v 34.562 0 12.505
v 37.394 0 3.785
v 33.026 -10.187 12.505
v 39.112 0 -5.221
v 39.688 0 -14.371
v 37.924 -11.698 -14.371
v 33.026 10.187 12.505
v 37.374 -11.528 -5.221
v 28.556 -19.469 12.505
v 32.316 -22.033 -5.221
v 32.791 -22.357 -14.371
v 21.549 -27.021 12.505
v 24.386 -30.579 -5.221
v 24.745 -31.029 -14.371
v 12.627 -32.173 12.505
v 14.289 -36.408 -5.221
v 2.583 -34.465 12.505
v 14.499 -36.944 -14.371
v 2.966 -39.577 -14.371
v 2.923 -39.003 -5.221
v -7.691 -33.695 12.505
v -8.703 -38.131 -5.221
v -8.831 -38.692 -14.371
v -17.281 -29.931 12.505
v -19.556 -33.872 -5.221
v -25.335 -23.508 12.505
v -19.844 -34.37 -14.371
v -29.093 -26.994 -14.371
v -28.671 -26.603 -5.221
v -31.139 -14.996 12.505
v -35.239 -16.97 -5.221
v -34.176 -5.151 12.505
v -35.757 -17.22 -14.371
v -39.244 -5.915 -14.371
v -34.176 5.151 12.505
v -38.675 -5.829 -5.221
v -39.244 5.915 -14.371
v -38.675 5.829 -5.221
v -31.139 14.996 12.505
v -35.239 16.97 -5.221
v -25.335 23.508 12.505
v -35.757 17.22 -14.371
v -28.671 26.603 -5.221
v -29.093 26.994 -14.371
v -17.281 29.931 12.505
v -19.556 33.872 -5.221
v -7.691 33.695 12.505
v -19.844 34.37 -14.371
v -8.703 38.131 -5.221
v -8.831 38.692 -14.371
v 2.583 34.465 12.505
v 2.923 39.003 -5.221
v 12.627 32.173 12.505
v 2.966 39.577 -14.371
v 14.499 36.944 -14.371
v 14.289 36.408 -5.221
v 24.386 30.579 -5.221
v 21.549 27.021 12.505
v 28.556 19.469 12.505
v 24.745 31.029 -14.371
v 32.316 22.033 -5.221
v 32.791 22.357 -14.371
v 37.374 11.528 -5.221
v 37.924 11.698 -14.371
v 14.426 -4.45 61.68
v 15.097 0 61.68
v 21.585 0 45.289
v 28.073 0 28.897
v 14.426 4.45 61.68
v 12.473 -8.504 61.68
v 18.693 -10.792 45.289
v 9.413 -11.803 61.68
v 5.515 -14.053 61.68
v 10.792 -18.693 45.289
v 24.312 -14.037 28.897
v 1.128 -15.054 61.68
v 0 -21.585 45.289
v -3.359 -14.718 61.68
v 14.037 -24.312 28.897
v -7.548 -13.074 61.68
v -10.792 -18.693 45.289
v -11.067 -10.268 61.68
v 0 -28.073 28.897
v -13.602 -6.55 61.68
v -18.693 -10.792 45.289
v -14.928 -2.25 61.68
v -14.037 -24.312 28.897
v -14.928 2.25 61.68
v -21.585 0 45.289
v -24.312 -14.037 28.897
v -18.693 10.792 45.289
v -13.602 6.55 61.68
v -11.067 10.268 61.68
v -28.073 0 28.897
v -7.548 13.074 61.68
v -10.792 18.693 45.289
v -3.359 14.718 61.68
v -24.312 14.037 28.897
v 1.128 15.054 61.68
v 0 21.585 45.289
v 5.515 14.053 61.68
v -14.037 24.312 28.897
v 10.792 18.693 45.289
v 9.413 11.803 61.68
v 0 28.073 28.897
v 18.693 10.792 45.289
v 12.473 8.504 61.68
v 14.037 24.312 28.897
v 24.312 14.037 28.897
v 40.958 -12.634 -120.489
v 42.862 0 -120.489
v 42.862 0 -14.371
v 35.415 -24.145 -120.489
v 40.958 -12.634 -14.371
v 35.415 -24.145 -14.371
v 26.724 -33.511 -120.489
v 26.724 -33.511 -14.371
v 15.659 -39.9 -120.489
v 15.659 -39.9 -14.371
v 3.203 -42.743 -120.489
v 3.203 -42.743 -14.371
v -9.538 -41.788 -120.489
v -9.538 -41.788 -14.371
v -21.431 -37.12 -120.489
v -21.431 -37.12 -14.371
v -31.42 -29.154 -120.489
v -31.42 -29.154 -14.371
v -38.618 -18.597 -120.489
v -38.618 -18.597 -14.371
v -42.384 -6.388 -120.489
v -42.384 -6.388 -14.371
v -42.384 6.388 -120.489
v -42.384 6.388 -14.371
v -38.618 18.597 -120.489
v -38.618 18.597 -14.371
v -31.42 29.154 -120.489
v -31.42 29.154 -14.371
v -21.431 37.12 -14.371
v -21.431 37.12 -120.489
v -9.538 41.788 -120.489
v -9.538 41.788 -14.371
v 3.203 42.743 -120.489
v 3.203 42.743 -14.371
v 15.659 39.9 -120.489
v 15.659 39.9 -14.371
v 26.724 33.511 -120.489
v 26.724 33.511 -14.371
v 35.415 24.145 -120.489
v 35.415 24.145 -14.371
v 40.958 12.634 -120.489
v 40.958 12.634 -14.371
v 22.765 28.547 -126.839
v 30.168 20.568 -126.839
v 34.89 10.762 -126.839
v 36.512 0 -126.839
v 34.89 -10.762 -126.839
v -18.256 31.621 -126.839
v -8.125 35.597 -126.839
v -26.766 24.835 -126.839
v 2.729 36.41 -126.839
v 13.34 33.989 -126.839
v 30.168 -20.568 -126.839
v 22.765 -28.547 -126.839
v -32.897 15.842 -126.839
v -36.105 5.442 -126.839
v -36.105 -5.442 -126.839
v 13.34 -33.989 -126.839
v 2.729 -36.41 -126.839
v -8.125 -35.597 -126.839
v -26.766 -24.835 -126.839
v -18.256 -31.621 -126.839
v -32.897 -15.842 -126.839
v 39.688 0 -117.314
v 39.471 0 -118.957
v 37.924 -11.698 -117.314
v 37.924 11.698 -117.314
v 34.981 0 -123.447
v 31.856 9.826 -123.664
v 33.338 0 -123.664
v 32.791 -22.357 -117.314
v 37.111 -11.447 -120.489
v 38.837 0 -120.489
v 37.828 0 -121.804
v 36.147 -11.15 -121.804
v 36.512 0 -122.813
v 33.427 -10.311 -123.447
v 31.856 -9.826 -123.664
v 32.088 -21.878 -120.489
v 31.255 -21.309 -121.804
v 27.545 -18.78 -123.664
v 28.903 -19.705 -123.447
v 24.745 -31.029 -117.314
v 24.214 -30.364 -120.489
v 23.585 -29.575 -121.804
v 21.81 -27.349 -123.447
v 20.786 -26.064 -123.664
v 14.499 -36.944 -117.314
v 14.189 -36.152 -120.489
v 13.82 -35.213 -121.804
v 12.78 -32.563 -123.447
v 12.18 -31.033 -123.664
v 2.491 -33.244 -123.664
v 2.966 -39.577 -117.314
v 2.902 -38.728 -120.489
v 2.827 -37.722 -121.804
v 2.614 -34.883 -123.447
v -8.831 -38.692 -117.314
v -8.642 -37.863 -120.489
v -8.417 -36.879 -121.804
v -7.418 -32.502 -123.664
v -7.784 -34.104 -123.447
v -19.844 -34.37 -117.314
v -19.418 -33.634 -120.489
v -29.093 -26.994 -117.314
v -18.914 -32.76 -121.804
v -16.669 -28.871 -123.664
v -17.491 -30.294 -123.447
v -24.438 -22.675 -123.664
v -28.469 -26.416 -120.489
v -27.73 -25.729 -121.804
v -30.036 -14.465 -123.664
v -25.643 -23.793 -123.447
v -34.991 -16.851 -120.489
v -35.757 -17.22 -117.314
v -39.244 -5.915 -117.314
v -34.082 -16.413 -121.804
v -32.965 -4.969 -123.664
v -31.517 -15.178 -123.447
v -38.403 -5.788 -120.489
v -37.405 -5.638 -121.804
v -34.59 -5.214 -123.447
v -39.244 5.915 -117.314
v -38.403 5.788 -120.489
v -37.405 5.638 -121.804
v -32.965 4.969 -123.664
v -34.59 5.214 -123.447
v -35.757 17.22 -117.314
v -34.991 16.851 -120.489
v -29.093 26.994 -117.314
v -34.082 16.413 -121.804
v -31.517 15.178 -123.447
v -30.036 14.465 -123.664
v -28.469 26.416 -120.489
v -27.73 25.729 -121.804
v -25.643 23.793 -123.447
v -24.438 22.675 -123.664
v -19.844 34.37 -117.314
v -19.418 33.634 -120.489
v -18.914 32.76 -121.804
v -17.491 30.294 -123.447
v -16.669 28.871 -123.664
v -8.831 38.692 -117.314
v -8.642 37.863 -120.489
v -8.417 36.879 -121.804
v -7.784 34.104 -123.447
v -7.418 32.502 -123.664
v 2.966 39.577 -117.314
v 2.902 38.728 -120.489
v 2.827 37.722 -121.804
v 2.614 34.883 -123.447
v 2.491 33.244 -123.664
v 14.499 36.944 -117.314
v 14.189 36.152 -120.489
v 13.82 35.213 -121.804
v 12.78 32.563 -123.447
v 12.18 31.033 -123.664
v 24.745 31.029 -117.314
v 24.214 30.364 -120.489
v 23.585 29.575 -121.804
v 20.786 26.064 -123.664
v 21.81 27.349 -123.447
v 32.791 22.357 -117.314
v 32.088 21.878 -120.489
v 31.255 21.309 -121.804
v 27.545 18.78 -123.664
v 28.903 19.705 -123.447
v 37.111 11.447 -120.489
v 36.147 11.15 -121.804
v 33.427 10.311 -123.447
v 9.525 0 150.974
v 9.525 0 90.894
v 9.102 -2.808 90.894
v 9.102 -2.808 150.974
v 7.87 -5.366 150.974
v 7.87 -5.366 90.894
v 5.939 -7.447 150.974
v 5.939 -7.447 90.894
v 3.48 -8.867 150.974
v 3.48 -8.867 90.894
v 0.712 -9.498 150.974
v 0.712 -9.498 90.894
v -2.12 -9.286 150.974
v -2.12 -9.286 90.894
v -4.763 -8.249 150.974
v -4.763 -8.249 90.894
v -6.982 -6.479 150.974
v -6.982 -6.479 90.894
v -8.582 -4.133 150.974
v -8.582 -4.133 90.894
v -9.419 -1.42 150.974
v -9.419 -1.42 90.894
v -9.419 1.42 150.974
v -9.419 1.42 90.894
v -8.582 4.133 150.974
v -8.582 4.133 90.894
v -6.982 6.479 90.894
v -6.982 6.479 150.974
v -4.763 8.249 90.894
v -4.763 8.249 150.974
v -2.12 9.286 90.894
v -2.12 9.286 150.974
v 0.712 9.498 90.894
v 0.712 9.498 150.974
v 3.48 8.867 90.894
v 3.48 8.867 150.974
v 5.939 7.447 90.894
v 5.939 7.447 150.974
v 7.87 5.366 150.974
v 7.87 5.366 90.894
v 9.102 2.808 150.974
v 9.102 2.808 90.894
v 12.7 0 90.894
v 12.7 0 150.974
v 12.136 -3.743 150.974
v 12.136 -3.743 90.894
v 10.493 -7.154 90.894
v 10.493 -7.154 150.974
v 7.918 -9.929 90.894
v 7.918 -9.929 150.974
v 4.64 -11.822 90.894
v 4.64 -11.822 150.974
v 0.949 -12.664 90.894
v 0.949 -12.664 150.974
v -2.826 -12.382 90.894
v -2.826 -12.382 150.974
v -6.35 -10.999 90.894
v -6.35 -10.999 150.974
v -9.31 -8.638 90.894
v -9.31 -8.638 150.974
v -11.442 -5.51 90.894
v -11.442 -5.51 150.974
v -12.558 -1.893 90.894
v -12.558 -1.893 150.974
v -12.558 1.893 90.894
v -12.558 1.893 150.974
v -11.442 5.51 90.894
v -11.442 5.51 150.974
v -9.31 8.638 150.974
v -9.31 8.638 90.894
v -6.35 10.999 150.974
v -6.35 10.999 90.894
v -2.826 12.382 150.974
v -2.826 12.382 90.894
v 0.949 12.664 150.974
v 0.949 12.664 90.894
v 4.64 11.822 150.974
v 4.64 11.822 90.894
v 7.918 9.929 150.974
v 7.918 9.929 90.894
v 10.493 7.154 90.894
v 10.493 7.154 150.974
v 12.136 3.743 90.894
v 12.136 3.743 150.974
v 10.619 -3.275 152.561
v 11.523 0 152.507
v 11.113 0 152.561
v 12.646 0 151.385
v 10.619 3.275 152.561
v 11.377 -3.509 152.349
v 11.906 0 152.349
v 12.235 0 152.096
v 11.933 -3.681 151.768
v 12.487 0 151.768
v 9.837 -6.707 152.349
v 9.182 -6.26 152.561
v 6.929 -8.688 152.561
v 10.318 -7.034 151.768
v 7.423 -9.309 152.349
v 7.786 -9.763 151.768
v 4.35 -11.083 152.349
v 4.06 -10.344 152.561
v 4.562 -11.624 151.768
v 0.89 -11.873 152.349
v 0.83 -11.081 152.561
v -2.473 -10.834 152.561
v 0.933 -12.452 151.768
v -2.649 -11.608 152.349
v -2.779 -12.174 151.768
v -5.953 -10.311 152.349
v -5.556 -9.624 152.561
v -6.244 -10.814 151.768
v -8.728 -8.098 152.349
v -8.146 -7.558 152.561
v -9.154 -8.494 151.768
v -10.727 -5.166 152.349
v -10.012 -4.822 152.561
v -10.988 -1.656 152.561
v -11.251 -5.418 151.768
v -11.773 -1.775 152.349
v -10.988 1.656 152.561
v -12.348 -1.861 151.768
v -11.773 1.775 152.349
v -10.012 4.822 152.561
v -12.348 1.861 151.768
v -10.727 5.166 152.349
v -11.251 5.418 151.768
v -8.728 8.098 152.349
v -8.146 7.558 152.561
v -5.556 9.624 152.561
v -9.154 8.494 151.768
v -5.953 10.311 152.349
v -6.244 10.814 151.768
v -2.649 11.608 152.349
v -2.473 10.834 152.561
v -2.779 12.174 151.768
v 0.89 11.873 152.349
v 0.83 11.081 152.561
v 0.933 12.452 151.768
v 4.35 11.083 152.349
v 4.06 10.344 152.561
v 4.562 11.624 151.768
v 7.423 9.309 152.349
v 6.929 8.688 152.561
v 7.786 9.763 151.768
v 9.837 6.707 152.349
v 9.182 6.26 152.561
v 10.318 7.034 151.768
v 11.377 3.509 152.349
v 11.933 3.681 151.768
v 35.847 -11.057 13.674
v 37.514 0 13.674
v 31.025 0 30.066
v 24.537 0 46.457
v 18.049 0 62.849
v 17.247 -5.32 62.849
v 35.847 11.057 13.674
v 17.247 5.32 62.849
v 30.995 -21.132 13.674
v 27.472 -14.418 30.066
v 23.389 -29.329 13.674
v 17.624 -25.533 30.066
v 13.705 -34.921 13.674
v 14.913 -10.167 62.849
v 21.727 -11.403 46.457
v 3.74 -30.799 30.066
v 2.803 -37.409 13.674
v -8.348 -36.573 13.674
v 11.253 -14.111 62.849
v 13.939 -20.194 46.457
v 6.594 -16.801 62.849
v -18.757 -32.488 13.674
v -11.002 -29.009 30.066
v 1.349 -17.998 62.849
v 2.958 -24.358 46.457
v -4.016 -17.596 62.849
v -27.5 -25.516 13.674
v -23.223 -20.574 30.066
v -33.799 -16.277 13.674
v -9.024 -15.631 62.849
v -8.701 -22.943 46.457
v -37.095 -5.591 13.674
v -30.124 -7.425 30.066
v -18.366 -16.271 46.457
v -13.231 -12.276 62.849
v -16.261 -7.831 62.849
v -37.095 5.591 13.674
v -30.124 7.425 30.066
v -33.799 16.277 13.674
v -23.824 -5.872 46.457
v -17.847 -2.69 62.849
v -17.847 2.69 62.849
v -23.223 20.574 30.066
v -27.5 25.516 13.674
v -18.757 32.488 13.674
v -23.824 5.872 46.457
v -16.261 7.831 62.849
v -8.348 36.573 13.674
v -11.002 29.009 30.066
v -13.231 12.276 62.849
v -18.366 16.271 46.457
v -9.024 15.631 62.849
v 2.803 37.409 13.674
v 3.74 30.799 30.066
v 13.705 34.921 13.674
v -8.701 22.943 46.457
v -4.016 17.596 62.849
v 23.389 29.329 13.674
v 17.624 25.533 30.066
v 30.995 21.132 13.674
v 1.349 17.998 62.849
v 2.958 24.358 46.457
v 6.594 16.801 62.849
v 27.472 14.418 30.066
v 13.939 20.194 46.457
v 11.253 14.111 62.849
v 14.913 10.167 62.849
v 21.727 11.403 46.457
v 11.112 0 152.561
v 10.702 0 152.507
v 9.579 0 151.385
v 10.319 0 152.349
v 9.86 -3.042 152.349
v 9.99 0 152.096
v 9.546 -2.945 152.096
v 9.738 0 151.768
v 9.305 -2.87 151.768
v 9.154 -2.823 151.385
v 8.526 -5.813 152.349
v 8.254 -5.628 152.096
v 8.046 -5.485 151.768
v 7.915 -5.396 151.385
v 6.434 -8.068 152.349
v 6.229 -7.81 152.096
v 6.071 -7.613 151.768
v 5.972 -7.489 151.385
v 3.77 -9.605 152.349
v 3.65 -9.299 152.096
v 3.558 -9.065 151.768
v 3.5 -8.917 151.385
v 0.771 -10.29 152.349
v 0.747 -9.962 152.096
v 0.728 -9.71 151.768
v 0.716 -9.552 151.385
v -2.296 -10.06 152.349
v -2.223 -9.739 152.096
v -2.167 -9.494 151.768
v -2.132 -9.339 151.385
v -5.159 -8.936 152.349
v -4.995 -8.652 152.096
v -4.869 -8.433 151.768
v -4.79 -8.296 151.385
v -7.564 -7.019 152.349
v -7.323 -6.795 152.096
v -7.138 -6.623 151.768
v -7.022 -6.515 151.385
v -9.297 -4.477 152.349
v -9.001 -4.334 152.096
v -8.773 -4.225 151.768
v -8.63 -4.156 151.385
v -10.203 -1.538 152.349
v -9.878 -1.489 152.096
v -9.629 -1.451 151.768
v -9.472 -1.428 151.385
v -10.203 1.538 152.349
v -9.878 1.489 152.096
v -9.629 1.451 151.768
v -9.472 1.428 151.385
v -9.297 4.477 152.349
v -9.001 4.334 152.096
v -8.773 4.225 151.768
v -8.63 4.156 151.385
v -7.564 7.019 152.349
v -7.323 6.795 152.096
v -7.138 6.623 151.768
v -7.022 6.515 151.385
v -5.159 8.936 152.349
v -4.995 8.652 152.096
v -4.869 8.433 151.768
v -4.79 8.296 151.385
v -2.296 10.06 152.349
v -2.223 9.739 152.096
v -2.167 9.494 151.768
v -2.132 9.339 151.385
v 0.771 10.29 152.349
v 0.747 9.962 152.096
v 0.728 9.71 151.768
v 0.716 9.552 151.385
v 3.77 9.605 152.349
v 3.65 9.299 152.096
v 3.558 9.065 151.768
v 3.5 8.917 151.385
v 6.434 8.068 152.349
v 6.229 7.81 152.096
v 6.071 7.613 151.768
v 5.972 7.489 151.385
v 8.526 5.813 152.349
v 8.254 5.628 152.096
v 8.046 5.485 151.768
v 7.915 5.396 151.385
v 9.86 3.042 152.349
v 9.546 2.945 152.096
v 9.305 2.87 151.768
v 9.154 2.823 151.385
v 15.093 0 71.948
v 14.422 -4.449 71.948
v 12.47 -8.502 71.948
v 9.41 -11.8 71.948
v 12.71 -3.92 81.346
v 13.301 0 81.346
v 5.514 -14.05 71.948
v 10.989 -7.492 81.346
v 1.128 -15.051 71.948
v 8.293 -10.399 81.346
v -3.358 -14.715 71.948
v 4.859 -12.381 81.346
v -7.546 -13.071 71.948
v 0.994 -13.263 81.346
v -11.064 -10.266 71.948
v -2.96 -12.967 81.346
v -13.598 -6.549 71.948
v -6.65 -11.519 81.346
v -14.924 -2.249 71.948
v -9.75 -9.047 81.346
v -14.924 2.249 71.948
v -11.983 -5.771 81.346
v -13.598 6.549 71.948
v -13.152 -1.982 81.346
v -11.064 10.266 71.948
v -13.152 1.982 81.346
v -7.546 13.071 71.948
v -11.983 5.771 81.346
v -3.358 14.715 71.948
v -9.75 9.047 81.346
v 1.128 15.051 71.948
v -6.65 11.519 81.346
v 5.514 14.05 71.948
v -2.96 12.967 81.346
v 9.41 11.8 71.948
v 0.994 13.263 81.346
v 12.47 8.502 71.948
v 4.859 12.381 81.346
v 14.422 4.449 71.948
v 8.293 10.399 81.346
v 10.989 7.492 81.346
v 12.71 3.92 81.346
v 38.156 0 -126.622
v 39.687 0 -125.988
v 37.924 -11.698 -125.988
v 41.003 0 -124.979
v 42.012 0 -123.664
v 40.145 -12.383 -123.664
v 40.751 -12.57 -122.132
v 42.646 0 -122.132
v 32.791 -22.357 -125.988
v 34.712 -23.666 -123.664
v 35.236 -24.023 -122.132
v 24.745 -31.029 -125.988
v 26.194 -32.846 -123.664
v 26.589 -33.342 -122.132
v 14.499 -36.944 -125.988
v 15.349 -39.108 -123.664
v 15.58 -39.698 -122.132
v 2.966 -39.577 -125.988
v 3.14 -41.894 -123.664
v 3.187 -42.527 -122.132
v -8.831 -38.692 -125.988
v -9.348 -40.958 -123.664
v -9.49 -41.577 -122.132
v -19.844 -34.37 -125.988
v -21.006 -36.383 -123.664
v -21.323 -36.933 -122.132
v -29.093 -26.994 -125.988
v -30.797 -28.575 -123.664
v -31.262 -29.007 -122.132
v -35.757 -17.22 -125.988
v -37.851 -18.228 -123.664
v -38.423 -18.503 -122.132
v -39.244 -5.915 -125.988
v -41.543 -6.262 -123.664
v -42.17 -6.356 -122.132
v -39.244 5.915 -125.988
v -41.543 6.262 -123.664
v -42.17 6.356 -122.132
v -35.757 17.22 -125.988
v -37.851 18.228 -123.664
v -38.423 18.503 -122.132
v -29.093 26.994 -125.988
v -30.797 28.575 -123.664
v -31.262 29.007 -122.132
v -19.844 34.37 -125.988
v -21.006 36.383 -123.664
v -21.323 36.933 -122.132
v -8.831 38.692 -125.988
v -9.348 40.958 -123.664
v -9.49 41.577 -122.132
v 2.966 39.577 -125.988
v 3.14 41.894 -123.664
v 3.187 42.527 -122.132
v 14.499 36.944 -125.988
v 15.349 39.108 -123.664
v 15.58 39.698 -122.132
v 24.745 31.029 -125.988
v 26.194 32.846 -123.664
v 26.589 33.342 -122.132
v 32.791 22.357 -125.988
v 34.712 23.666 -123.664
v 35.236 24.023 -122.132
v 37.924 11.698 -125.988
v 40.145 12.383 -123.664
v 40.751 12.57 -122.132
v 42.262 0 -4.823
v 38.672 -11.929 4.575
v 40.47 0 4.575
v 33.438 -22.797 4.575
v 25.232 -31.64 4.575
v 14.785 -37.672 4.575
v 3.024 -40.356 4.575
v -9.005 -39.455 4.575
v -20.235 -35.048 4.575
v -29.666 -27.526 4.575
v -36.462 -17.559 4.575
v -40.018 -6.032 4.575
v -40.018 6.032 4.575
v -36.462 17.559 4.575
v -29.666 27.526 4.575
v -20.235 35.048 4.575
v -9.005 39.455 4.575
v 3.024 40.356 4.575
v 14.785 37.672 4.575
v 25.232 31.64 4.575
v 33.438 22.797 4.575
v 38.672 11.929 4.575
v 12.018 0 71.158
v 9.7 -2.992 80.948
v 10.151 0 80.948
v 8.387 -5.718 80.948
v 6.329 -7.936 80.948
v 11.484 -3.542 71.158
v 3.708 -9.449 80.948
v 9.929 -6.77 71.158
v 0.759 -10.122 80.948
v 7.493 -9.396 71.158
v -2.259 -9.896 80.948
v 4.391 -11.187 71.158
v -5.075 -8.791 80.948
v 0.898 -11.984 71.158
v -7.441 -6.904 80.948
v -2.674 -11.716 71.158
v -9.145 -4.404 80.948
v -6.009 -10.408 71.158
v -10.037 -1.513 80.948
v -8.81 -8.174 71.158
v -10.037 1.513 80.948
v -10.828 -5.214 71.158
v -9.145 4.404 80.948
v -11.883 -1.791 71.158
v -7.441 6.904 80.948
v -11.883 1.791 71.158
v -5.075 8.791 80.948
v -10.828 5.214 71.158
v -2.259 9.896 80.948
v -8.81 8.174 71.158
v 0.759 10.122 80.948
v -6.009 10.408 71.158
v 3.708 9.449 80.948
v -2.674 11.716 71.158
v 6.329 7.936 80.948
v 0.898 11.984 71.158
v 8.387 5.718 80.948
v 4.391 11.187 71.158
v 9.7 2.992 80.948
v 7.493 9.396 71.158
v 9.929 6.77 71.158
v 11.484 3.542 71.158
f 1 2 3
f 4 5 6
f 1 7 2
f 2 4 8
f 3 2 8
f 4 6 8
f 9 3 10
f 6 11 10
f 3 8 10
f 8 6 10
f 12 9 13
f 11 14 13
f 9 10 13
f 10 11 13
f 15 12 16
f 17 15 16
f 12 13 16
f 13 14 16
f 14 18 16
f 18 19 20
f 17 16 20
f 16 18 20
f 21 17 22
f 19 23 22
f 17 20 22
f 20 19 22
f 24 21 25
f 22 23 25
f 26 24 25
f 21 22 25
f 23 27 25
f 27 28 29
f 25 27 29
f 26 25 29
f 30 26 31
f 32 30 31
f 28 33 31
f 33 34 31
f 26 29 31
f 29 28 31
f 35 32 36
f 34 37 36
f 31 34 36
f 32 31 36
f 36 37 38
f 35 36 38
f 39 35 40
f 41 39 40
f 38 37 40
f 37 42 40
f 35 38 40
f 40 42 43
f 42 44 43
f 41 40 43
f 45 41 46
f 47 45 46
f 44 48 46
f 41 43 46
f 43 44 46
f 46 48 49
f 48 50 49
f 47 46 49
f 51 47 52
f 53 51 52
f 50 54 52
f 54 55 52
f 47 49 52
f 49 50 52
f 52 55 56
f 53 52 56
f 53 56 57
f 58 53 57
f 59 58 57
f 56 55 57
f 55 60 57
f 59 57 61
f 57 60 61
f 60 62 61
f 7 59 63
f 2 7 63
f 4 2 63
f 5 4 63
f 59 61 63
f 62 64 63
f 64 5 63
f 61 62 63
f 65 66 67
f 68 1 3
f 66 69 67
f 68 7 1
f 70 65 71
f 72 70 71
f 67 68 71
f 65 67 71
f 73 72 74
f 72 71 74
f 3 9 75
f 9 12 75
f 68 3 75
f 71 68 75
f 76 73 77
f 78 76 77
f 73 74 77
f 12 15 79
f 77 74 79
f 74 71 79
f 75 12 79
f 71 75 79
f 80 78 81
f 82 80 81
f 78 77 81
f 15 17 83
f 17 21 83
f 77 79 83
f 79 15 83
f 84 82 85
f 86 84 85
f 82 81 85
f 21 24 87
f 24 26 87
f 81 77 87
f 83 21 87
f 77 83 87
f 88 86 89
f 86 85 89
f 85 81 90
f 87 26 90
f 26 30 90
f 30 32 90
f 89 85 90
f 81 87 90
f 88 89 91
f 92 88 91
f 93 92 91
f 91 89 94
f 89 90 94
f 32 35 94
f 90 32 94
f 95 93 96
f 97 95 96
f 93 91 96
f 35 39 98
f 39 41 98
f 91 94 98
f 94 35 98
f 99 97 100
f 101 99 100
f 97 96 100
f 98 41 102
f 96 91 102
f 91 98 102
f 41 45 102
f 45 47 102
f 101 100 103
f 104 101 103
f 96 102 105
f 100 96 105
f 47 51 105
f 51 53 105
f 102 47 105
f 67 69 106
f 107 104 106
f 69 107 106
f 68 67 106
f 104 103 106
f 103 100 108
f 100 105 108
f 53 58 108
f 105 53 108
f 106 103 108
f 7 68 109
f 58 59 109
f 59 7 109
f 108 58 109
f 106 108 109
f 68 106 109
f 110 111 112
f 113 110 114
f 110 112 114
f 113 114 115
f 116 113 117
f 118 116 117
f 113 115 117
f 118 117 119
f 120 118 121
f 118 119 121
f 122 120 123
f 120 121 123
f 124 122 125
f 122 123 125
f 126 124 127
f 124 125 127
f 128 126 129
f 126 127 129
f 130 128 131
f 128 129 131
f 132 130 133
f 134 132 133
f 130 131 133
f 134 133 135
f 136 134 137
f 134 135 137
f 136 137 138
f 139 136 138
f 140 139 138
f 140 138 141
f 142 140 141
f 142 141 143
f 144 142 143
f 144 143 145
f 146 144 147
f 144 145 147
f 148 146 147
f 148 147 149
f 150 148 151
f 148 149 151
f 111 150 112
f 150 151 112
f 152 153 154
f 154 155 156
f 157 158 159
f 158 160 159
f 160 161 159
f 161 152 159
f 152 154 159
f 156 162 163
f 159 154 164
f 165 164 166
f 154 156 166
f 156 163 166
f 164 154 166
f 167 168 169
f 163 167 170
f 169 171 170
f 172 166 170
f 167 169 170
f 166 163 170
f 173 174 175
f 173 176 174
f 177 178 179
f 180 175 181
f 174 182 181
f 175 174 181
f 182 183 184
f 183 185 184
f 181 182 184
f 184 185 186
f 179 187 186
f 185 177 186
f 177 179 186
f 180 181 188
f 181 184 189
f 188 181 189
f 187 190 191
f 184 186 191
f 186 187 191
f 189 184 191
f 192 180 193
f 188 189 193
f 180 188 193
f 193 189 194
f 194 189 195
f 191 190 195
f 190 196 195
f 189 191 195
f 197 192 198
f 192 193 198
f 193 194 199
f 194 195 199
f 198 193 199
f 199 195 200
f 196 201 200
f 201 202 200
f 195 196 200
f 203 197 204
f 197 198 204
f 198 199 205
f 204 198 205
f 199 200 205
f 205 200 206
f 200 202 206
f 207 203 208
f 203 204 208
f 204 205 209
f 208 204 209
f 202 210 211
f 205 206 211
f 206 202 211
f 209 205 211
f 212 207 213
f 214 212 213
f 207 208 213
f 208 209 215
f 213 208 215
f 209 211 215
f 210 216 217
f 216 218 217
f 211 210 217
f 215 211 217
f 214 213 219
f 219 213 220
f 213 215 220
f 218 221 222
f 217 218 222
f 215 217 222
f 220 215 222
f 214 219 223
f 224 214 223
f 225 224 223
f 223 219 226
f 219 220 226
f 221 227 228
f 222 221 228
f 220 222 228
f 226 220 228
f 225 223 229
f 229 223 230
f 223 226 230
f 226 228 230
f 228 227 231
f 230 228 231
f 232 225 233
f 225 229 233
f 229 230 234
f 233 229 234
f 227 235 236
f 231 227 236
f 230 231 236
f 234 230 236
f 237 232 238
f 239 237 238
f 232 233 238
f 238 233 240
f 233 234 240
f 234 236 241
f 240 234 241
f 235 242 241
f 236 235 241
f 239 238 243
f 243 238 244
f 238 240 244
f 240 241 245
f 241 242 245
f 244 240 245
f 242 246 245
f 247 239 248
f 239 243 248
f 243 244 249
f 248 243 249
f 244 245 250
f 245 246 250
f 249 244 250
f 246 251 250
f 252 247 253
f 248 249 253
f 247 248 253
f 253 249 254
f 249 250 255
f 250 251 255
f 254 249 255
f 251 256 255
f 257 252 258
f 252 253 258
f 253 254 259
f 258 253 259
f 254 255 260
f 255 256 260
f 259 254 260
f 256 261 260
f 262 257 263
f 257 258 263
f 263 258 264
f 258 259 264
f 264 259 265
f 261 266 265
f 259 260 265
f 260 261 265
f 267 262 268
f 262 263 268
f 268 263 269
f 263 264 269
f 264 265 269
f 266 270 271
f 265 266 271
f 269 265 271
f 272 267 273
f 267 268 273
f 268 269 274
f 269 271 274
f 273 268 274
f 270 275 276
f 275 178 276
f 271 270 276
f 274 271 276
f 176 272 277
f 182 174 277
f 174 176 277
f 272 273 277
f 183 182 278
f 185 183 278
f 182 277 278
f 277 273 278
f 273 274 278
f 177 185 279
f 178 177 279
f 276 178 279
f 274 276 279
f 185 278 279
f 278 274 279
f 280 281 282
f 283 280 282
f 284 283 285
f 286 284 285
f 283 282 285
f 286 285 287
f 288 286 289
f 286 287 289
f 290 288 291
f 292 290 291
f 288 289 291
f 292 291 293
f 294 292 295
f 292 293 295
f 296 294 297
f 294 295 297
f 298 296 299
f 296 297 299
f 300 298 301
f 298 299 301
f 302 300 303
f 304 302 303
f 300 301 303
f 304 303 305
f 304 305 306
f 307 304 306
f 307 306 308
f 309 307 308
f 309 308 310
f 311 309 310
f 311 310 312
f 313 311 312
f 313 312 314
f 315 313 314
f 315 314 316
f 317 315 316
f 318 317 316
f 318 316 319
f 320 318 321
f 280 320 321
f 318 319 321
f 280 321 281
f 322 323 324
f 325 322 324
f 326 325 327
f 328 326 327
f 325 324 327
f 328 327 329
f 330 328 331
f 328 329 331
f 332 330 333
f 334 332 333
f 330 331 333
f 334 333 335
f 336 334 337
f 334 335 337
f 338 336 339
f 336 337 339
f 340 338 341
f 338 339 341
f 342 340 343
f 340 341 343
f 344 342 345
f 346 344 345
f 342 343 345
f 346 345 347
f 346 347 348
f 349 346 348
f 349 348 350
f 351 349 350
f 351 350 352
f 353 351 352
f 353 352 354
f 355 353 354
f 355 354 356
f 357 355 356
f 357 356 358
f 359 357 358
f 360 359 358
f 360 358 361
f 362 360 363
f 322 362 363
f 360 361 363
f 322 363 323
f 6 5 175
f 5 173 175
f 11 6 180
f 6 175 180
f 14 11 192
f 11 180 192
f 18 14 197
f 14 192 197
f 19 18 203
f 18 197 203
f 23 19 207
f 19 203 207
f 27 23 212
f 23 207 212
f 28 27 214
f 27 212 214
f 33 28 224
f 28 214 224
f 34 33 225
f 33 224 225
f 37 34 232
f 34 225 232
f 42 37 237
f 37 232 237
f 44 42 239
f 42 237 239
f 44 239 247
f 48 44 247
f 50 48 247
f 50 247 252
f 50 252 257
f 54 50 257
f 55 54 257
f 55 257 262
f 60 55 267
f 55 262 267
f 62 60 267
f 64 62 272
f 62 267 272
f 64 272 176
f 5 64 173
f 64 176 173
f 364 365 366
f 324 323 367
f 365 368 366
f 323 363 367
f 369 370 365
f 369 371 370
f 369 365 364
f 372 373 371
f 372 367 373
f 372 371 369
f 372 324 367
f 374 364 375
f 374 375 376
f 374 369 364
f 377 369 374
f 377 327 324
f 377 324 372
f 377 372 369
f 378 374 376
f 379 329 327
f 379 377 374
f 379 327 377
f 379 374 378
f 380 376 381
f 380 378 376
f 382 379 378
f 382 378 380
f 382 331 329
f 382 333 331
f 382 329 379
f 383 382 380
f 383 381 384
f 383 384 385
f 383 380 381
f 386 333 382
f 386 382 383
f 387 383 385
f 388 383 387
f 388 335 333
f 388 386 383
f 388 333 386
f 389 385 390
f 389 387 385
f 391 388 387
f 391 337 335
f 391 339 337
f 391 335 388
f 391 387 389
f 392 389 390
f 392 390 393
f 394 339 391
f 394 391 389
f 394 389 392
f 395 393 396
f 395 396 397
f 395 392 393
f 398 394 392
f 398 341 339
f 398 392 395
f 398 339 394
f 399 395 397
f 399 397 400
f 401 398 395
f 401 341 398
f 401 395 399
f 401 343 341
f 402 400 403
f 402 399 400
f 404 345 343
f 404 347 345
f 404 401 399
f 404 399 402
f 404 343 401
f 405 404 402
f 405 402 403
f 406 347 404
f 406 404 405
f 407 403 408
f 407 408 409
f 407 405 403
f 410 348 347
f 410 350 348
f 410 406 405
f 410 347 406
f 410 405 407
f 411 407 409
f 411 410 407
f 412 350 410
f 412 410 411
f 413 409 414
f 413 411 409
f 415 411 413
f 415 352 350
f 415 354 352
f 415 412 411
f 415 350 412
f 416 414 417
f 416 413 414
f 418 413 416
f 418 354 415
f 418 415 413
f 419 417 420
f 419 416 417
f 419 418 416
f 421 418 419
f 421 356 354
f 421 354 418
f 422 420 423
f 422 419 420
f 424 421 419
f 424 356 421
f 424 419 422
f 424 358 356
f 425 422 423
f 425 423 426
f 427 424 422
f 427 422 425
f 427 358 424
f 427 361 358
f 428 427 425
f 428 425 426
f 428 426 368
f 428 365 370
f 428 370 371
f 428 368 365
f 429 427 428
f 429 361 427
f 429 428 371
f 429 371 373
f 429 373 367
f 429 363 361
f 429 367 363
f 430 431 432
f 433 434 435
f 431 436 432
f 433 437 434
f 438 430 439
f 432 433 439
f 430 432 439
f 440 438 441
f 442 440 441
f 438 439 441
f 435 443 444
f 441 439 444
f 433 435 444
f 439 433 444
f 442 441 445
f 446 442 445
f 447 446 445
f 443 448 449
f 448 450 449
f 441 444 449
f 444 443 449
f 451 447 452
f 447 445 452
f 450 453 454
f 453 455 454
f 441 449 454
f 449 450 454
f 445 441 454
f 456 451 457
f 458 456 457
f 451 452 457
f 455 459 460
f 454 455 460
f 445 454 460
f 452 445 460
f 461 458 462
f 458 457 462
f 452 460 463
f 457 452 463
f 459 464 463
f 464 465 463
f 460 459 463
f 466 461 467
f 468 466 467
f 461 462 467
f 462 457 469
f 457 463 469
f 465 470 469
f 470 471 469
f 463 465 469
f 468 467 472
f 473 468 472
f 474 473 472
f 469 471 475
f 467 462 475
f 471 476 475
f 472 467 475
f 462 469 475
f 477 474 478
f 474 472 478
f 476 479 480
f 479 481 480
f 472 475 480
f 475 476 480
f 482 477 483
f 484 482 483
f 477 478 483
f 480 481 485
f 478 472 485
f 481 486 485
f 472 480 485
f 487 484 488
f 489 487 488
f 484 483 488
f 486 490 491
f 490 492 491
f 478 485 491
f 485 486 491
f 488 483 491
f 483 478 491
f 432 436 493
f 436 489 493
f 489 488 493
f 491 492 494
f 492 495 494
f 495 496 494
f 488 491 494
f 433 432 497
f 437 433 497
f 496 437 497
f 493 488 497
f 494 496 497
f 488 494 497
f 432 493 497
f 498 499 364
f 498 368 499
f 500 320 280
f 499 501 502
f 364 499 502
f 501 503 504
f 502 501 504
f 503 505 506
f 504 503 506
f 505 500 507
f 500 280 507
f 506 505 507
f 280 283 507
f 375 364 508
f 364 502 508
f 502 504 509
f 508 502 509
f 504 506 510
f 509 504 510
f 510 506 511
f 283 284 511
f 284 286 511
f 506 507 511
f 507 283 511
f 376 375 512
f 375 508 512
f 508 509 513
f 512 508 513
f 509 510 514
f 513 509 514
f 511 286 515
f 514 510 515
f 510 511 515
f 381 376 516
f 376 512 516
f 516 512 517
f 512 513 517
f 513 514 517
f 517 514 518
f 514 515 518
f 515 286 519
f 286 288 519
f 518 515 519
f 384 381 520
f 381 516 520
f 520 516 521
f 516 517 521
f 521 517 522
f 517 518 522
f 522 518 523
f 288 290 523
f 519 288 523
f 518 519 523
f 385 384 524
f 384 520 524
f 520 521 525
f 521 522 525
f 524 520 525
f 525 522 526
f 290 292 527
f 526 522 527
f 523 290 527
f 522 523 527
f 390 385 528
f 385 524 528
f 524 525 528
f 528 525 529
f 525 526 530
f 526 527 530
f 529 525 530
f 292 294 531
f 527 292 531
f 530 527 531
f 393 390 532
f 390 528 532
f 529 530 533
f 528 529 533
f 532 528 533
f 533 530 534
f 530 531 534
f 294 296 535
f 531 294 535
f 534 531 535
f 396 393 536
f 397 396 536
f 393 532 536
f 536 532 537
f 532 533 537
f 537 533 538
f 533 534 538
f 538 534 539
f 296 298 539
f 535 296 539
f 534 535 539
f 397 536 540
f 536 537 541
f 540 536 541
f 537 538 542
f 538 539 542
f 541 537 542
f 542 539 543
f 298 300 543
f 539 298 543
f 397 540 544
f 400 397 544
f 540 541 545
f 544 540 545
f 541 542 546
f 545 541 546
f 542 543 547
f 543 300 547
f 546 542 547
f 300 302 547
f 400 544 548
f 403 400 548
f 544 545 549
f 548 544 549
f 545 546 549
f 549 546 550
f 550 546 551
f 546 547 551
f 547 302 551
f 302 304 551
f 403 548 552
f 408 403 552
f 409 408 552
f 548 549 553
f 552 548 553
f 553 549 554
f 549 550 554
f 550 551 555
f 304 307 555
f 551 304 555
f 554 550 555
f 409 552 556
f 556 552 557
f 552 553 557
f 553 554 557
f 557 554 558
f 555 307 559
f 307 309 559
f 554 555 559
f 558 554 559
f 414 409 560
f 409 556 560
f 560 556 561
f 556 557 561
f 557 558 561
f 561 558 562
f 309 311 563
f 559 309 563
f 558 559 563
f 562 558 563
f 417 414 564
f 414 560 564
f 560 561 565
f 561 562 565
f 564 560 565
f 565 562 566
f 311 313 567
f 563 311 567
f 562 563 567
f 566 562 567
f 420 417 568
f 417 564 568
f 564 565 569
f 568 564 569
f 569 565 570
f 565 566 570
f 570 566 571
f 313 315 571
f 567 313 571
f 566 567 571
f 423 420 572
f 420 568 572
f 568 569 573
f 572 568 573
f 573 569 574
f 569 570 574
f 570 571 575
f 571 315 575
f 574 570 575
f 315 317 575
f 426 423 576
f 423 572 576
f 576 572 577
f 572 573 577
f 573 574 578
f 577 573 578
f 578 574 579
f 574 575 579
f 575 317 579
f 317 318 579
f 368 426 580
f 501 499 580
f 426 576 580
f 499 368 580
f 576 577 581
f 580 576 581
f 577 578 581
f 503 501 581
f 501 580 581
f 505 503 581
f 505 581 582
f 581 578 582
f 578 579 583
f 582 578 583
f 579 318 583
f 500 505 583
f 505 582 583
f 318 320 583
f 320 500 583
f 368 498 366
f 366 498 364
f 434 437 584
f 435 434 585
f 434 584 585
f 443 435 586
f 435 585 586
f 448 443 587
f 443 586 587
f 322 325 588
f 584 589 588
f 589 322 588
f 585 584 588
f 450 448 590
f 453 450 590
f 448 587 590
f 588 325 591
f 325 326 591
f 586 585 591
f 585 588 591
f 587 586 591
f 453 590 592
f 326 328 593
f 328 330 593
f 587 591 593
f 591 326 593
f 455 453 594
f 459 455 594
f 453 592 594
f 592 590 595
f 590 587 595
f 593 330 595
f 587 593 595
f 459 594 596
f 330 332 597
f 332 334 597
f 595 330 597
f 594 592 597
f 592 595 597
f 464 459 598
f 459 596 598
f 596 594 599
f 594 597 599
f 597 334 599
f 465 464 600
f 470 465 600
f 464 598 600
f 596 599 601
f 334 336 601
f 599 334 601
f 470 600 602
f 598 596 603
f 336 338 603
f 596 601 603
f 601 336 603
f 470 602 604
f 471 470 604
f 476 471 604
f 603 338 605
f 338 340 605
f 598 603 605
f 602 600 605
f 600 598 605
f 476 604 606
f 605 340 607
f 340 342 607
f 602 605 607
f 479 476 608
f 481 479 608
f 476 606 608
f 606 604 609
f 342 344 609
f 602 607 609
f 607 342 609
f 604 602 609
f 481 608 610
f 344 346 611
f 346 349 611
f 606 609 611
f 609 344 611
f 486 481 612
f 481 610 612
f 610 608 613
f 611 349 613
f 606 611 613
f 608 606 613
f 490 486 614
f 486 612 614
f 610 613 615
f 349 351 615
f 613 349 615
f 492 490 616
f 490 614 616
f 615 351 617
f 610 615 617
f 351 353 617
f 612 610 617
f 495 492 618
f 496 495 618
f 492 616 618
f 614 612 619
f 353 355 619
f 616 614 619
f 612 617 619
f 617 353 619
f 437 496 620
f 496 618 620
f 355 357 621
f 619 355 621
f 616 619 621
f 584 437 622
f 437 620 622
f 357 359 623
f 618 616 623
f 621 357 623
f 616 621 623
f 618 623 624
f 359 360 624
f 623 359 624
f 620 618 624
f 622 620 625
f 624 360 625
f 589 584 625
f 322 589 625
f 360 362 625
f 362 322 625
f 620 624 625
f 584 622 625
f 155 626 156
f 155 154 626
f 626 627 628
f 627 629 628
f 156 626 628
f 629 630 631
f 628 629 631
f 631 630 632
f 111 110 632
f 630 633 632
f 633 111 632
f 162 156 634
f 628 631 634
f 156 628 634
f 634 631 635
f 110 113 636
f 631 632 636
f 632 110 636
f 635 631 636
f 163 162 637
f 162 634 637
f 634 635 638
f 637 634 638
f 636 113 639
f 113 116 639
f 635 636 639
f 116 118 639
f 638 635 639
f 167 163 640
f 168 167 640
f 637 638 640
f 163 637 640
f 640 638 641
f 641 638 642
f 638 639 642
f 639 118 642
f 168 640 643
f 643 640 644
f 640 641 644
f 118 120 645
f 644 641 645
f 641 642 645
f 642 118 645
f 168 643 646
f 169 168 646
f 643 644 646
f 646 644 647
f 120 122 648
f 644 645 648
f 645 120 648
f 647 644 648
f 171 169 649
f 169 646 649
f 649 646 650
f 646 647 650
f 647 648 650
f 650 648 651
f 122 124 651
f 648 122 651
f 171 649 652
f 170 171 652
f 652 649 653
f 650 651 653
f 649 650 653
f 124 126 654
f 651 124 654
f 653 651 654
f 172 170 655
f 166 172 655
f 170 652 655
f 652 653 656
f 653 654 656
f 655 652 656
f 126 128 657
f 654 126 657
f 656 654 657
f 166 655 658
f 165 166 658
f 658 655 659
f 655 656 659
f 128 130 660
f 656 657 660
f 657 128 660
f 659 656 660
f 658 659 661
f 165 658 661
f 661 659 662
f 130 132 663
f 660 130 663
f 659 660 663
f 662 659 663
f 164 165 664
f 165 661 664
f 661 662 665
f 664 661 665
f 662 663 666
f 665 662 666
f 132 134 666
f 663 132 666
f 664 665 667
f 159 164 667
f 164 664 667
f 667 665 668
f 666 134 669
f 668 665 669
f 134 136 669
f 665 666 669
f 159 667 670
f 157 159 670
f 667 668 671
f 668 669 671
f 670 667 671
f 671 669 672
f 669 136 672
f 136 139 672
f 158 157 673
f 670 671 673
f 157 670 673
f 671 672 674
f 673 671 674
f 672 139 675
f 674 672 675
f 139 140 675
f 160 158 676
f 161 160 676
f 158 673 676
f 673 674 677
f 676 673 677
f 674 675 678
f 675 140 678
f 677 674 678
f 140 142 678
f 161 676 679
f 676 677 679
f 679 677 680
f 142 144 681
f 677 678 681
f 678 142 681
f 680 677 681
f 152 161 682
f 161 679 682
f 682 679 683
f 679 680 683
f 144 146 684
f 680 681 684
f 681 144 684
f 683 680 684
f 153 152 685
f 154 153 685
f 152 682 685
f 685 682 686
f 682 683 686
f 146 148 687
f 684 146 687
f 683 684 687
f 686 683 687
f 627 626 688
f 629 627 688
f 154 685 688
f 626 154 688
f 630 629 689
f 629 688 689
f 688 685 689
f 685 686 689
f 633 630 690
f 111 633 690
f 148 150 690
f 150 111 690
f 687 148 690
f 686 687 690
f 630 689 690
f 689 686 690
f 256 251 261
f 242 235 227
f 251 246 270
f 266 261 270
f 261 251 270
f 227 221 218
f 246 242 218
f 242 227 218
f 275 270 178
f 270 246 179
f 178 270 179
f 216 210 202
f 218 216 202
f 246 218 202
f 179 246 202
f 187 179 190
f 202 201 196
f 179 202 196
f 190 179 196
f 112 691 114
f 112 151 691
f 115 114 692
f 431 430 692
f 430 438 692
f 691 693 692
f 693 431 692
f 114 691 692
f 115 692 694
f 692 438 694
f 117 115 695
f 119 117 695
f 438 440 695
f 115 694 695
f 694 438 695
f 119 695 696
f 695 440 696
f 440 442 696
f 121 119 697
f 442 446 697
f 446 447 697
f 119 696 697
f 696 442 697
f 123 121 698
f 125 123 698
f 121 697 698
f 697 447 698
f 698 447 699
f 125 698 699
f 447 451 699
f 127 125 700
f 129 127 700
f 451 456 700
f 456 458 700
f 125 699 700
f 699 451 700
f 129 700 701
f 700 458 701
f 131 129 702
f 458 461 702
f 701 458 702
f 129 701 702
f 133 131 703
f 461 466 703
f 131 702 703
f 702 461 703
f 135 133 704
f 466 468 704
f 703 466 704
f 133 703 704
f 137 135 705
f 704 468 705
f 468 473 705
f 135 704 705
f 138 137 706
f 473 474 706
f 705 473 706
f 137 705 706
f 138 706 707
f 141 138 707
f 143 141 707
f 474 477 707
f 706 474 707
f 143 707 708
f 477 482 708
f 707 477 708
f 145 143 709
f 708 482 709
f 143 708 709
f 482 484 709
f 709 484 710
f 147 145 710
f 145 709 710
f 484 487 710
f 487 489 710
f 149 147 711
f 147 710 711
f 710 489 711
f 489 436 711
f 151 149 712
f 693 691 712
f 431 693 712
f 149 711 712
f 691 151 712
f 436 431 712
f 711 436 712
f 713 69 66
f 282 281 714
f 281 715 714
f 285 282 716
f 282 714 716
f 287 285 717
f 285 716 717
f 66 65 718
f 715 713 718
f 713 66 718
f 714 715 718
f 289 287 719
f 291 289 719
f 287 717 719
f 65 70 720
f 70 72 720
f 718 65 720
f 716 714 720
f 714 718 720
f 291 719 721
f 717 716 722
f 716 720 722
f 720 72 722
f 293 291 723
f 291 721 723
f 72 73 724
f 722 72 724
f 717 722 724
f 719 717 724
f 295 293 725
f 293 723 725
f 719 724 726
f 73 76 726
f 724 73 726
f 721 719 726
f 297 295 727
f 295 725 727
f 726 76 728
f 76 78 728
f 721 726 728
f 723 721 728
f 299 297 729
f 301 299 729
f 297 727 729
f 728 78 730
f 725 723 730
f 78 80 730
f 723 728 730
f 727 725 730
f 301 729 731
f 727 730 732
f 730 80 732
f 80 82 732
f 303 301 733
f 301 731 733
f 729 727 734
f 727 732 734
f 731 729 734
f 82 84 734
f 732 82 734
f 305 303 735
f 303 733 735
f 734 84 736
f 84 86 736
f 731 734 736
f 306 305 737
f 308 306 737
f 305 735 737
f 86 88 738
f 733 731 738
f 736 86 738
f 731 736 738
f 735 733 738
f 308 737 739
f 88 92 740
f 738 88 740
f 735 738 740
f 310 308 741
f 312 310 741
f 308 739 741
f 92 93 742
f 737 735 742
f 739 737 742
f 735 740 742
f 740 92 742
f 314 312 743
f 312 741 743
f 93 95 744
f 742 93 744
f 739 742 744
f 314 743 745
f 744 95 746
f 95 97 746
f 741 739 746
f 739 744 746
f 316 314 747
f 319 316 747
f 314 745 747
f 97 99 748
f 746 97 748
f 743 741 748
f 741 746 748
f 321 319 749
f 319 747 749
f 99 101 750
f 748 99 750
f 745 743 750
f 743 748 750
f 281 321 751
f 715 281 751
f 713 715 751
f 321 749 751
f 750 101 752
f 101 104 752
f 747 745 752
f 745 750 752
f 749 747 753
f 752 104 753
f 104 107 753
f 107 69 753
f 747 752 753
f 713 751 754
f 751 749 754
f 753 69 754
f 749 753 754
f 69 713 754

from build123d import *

# Parameters (mm, degrees)
F2_R = 1.58749


# Not quite as in the source:
# - a fillet or chamfer is up to 0.001 mm smaller than in the source, because OpenCascade refuses the exact size


with BuildPart() as f1:
    # F0 (on Front) → F1 (revolve)
    with BuildSketch(Plane.XZ):
        with BuildLine():
            Line((12.7, 152.5613266138), (9.525, 152.5613266138))
            Line((9.525, 152.5613266138), (9.525, 90.8940221579))
            ThreePointArc((9.525, 90.8940221579), (10.9303408592, 76.0238211347), (15.0966000875, 61.6801763592))
            Line((15.0966000875, 61.6801763592), (34.5616279195, 12.5053692045))
            ThreePointArc((34.5616279195, 12.5053692045), (38.3945864095, -0.6907839889), (39.6875, -14.3713689303))
            Line((39.6875, -14.3713689303), (39.6875, -117.3136733862))
            ThreePointArc((39.6875, -117.3136733862), (37.8276280605, -121.8038014467), (33.3375, -123.6636733862))
            Line((33.3375, -123.6636733862), (0, -123.6636733862))
            Line((0, -123.6636733862), (0, -126.8386733862))
            Line((0, -126.8386733862), (36.5125, -126.8386733862))
            ThreePointArc((36.5125, -126.8386733862), (41.0026280605, -124.9788014467), (42.8625, -120.4886733862))
            Line((42.8625, -120.4886733862), (42.8625, -14.3713689303))
            ThreePointArc((42.8625, -14.3713689303), (41.5133727751, -0.095975948), (37.513763916, 13.6739230365))
            Line((37.513763916, 13.6739230365), (18.048736084, 62.8487301912))
            ThreePointArc((18.048736084, 62.8487301912), (14.0491272249, 76.6186291756), (12.7, 90.8940221579))
            Line((12.7, 90.8940221579), (12.7, 152.5613266138))
        make_face()
    revolve(axis=Axis((0, 0, 12.8613266138), (0, 0, -1)))

    # F2 (radius 1.5875 in the source; OpenCascade refuses exactly that, so slightly less here)
    f2_edges = [f1.edges().sort_by_distance(p)[0] for p in [
        (-12.7, 0, 152.561327),
        (-9.525, 0, 152.561327),
    ]]
    fillet(f2_edges, radius=F2_R)


solid = f1.part
